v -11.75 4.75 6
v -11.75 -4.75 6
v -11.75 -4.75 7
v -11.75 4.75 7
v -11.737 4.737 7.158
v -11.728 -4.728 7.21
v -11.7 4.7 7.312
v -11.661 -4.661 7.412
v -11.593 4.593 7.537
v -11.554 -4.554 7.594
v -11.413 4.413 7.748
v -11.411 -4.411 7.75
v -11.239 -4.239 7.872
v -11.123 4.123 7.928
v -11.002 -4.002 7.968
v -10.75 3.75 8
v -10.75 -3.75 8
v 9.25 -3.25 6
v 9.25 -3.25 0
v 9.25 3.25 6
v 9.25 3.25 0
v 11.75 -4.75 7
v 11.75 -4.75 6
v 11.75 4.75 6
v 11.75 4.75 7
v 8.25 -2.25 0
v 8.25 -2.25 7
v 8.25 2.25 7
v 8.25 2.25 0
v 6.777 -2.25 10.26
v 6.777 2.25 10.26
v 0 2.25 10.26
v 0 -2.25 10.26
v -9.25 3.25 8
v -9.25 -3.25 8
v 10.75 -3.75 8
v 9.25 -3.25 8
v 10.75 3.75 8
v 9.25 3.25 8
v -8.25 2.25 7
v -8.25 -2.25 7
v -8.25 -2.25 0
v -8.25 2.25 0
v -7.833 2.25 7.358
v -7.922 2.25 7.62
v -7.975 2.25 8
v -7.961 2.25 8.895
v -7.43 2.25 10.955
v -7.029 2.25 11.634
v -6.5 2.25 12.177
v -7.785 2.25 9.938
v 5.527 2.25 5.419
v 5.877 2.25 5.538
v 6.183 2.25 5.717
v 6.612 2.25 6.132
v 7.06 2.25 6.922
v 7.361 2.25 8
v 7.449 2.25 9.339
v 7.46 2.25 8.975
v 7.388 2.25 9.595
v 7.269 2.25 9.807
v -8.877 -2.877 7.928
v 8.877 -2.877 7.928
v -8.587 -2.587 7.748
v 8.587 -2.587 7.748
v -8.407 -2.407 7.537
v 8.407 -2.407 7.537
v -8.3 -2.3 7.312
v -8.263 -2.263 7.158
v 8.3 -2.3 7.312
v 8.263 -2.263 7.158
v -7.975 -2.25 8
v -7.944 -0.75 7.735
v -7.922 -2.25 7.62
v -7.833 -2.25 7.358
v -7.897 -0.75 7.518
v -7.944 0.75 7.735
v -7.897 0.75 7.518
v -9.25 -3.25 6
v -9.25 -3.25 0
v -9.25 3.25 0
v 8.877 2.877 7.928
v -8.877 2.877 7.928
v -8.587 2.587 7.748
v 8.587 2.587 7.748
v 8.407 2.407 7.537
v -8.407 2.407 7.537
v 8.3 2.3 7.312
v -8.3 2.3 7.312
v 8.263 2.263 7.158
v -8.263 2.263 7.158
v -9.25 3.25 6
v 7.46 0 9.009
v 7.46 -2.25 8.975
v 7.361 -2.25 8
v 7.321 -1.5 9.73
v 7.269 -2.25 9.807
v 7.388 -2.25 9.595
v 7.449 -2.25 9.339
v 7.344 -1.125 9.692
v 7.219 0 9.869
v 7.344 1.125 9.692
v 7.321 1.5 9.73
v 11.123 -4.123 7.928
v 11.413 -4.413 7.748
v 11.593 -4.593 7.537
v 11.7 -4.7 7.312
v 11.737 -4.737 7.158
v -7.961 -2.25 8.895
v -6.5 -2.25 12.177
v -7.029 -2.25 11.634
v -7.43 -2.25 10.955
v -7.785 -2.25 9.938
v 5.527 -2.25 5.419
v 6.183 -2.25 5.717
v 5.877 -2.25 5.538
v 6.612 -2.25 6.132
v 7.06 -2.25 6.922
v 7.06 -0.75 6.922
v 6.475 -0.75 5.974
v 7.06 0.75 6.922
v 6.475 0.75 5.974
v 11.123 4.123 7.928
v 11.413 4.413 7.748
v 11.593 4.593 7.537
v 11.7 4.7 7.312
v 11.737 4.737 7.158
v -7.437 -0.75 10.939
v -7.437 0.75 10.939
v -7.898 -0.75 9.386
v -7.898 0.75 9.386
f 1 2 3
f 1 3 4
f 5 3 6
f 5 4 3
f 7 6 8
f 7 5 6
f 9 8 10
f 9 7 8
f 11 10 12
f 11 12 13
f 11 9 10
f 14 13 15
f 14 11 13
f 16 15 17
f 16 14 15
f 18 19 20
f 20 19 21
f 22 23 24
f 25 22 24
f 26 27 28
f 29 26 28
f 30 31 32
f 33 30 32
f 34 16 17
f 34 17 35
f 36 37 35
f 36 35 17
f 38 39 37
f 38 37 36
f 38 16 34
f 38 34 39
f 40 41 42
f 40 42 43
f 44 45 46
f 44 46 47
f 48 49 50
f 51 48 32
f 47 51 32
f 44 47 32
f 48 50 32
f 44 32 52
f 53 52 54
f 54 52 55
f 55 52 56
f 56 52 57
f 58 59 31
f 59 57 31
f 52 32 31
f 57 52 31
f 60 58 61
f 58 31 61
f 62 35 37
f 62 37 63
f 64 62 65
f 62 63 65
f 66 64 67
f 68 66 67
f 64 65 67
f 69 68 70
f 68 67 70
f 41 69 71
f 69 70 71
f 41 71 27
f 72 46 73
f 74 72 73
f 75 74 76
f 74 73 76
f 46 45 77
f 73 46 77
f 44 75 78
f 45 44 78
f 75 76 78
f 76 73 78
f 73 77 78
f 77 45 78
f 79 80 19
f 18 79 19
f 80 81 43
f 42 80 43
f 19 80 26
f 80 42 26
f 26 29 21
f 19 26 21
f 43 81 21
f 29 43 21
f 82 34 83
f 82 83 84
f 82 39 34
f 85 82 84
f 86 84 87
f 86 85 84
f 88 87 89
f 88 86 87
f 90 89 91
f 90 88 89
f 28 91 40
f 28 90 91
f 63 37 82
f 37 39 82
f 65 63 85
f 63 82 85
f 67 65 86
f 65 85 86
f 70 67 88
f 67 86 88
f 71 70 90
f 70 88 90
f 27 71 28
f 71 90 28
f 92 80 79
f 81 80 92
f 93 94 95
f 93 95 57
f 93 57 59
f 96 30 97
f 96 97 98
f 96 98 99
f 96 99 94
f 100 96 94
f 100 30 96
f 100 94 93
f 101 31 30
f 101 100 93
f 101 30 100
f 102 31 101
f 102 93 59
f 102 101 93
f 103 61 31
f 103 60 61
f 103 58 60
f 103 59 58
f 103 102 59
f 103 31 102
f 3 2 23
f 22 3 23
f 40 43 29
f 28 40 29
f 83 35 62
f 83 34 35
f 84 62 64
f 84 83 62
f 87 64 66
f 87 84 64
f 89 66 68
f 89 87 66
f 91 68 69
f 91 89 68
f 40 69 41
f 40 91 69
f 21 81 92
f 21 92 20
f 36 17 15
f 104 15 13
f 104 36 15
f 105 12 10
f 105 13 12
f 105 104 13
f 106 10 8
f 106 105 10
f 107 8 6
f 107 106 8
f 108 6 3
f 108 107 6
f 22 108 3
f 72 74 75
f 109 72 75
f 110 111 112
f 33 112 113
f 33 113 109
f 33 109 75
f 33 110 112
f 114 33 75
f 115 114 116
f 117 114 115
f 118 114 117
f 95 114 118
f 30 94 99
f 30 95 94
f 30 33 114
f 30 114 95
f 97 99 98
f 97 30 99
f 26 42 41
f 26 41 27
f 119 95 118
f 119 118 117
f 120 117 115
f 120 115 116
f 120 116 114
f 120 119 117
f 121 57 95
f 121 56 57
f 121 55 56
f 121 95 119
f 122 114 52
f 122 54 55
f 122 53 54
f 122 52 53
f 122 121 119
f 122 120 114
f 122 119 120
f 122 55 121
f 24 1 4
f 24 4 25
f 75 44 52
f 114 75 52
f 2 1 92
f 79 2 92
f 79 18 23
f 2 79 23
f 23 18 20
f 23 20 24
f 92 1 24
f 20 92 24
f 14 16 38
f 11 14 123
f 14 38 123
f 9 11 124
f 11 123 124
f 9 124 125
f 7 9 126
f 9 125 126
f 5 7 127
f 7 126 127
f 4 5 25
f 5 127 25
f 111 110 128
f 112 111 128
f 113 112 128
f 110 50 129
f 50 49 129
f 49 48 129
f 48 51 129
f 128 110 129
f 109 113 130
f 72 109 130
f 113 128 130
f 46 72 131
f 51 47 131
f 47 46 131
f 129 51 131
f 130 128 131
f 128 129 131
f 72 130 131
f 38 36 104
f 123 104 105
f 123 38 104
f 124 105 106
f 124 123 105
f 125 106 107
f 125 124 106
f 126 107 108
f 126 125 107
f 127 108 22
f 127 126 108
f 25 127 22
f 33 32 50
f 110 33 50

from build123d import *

# Parameters (mm, degrees)
F0_W     = 18.5
F0_H     = 6.5
F0_W_2   = 16.5
F0_H_2   = 4.5
F1_DEPTH = 6
F2_W     = 23.5
F2_H     = 9.5
F2_W_2   = 18.5
F2_H_2   = 6.5
F2_W_3   = 16.5
F2_H_3   = 4.5
F3_DEPTH = 2
F5_DEPTH = 4.5
F6_R     = 1


with BuildPart() as f1:
    # F0 (on Top) → F1 (new body)
    with BuildSketch(Plane.XY):
        Rectangle(F0_W, F0_H)
        Rectangle(F0_W_2, F0_H_2, mode=Mode.SUBTRACT)
    extrude(amount=F1_DEPTH)

    # F2 (on face) → F3 (join)
    with BuildSketch(Plane.XY.offset(6)):
        Rectangle(F2_W, F2_H)
        Rectangle(F2_W_2, F2_H_2, mode=Mode.SUBTRACT)
        Rectangle(F2_W_2, F2_H_2)
        Rectangle(F2_W_3, F2_H_3, mode=Mode.SUBTRACT)
    extrude(amount=F3_DEPTH)

    # F6
    f6_edges = [f1.edges().sort_by_distance(p)[0] for p in [
        (0, 4.75, 8),
        (-11.75, 0, 8),
        (0, -4.75, 8),
        (11.75, 0, 8),
        (0, 2.25, 8),
        (8.25, 0, 8),
        (0, -2.25, 8),
        (-8.25, 0, 8),
    ]]
    fillet(f6_edges, radius=F6_R)


with BuildPart() as f5:
    # F4 (on face) → F5 (new body, through all)
    with BuildSketch(Plane.XZ.offset(-2.25)):
        with BuildLine():
            Line((6.777, 10.2598406955), (0, 10.2598406955))
            Line((0, 10.2598406955), (-6.5, 12.1768942129))
            add(Edge.make_bspline(
                [(-6.5, 12.1768942129), (-7.7057169905, 11.257187587), (-8.0602164106, 9.1413128094), (-7.9747951659, 8)],
                knots=[0, 0, 0, 0, 3.994302847, 3.994302847, 3.994302847, 3.994302847], degree=3))
            Line((-7.9747951659, 8), (7.3609953707, 8))
            add(Edge.make_bspline(
                [(6.777, 10.2598406955), (7.3669994968, 9.8072325619), (7.516710158, 9.5268105324), (7.4284491197, 8.3819437932), (7.3609953707, 8)],
                knots=[0, 0, 0, 0, 0.3715223911, 0.5386986046, 0.5386986046, 0.5386986046, 0.5386986046], degree=3))
        make_face()
        with BuildLine():
            Line((7.3609953707, 8), (-7.9747951659, 8))
            add(Edge.make_bspline(
                [(-7.9747951659, 8), (-7.9532875572, 7.7126369514), (-7.9038913414, 7.4870558968), (-7.8331715094, 7.3579053432)],
                knots=[3.994302847, 3.994302847, 3.994302847, 3.994302847, 5, 5, 5, 5], degree=3))
            Line((-7.8331715094, 7.3579053432), (5.5272389137, 5.4185498317))
            add(Edge.make_bspline(
                [(7.3609953707, 8), (7.174865371, 6.9460749168), (6.683687286, 5.6892079201), (5.5272389137, 5.4185498317)],
                knots=[0.5386986046, 0.5386986046, 0.5386986046, 0.5386986046, 1, 1, 1, 1], degree=3))
        make_face()
    extrude(amount=F5_DEPTH)


solid = Compound([f1.part, f5.part])
